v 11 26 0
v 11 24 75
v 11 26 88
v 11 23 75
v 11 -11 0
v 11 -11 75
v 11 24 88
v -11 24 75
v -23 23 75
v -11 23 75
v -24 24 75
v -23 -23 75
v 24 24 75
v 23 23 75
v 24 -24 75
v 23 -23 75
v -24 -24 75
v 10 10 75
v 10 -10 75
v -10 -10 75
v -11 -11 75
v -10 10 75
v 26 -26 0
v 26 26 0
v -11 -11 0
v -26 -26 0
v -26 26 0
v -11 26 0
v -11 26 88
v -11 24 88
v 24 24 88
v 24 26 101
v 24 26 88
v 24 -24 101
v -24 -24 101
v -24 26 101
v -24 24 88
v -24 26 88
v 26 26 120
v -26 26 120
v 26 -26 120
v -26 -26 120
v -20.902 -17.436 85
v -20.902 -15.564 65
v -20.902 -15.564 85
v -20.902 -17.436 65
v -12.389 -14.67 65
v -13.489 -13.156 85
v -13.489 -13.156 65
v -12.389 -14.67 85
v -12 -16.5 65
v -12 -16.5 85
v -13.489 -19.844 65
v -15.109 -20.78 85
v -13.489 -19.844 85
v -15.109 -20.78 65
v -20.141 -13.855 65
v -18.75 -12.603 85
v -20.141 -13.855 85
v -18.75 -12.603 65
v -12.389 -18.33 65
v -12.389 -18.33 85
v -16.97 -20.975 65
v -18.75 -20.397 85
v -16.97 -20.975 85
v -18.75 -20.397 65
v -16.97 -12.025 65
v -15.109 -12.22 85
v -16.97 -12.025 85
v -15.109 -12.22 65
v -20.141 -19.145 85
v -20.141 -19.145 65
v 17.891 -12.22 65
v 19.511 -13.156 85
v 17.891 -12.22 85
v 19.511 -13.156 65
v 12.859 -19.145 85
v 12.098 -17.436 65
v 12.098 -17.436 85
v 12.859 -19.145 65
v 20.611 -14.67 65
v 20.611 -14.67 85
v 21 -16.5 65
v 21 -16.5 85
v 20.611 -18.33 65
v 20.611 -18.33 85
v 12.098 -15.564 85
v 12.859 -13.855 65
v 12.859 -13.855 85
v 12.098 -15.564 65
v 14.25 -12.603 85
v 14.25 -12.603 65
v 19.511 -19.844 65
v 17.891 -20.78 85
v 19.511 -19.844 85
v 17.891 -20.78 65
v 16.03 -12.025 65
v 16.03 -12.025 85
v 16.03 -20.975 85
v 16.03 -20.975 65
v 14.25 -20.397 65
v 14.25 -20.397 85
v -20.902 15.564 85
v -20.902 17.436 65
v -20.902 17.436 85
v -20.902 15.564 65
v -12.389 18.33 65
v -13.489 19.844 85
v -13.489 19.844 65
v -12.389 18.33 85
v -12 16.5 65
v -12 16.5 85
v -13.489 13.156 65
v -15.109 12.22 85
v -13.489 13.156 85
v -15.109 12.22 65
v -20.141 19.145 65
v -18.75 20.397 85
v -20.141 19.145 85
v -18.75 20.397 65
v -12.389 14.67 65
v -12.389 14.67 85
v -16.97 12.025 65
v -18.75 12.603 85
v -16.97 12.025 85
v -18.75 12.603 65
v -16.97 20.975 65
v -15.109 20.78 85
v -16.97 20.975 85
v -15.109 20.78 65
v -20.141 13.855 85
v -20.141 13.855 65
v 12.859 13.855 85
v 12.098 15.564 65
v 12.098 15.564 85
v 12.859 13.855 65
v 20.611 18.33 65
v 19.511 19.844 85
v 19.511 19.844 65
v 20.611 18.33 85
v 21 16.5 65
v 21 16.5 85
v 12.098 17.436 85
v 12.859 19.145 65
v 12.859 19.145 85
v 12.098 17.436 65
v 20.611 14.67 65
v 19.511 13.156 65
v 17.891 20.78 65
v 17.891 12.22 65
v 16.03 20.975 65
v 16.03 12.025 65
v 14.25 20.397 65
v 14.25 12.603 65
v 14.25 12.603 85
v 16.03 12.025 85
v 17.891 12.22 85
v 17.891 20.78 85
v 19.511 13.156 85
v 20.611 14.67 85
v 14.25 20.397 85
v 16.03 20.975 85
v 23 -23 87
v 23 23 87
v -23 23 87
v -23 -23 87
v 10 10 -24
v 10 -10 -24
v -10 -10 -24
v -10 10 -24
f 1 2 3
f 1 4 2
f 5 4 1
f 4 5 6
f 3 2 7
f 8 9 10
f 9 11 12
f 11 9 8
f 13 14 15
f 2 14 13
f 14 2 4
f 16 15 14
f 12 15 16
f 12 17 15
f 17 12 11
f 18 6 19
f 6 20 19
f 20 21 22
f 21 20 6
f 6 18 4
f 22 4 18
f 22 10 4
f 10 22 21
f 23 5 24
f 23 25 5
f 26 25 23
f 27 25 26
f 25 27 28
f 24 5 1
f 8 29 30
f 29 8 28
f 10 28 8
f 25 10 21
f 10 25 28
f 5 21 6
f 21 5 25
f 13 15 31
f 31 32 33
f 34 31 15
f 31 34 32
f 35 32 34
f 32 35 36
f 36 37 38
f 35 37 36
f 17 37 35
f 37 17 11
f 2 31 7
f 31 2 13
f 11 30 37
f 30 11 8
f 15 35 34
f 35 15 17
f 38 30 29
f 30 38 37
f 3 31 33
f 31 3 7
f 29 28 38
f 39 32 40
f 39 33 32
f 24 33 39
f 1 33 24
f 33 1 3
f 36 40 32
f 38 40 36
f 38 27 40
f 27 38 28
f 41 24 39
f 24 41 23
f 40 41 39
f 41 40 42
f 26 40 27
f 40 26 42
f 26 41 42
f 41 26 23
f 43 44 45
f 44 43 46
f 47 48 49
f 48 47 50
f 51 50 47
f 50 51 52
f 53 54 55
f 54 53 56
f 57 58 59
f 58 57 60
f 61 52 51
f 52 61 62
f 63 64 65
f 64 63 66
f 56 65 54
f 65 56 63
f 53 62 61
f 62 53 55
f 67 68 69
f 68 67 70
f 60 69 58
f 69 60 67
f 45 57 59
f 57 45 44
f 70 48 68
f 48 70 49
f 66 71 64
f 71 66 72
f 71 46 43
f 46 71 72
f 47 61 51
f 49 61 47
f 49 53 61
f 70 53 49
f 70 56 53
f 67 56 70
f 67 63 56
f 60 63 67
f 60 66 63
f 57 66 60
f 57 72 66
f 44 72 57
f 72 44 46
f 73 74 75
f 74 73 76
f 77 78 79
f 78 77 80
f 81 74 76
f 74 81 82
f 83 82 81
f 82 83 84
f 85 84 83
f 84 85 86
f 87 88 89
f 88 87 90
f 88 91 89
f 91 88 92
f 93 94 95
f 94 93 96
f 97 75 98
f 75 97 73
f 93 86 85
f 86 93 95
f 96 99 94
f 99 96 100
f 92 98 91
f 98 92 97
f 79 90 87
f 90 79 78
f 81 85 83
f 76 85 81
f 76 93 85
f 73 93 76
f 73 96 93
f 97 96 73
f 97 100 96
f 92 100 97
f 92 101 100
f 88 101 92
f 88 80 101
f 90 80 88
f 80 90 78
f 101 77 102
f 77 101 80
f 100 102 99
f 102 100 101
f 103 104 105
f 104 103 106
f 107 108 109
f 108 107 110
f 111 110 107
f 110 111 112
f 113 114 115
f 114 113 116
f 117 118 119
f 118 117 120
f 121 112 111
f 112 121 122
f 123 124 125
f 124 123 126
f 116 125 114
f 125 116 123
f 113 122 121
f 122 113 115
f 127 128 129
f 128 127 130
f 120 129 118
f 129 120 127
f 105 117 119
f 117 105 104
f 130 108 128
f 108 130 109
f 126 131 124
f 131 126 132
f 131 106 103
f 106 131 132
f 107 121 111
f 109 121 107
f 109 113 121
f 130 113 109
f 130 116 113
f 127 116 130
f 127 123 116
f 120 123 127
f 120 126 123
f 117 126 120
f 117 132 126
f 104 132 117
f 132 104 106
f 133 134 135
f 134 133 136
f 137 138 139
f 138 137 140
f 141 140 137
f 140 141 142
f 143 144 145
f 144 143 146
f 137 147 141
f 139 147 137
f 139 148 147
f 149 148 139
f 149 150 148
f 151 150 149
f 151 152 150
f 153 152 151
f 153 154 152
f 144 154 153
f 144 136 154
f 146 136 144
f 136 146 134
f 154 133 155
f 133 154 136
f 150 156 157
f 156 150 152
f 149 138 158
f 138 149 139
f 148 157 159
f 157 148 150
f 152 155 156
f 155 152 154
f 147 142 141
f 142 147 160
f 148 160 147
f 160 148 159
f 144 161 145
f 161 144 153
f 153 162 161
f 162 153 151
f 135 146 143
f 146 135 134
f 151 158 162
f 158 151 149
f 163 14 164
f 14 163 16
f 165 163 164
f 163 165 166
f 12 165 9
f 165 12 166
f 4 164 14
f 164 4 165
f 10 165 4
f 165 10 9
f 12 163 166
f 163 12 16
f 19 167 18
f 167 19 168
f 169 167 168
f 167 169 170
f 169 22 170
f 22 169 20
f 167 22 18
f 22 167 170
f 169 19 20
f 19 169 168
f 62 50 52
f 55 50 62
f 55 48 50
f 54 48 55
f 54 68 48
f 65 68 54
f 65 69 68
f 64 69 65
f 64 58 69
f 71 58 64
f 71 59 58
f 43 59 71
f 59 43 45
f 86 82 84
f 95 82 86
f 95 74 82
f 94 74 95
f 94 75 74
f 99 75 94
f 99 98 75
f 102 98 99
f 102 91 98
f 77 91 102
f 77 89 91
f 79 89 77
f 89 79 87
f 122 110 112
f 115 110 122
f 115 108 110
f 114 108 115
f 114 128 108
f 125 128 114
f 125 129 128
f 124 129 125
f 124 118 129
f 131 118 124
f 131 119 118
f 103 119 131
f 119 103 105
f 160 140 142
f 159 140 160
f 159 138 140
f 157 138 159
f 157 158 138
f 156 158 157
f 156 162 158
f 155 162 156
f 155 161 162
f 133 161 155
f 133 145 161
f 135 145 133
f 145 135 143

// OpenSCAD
translate([0.0,0.0,0.0])scale([1.0,1.0,1.0])rotate([0.0,0.0,0.0])  difference()  {
difference()  {
translate([-26.0,-26.0,0.0])cube([52.0,52.0,120.0]);
union()  {
translate([-11.0,-11.0,0.0])cube([22.0,22.0,75.0]);
translate([0.0,0.0,75.0])translate([-24.0,-24.0,0.0])cube([48.0,48.0,26.0]);
translate([-11.0,0.0,0.0])cube([22.0,26.0,88.0]);
translate([-24.0,0.0,88.0])cube([48.0,26.0,13.0]);
}
}
translate([0.0,0.0,65.0])  {
translate([-16.5,-16.5,0.0])cylinder(r=4.5,h=10.0);
translate([16.5,-16.5,0.0])cylinder(r=4.5,h=10.0);
translate([-16.5,16.5,0.0])cylinder(r=4.5,h=10.0);
translate([16.5,16.5,0.0])cylinder(r=4.5,h=10.0);
}
}
translate([0.0,0.0,0.0])scale([1.0,1.0,1.0])rotate([0.0,0.0,0.0])  difference()  {
union()  {
translate([0.0,0.0,75.0])translate([-23.0,-23.0,0.0])cube([46.0,46.0,12.0]);
translate([0.0,0.0,-24.0])translate([-10.0,-10.0,0.0])cube([20.0,20.0,99.0]);
}
translate([0.0,0.0,75.0])  {
translate([-16.5,-16.5,0.0])cylinder(r=4.5,h=10.0);
translate([16.5,-16.5,0.0])cylinder(r=4.5,h=10.0);
translate([-16.5,16.5,0.0])cylinder(r=4.5,h=10.0);
translate([16.5,16.5,0.0])cylinder(r=4.5,h=10.0);
}
}
